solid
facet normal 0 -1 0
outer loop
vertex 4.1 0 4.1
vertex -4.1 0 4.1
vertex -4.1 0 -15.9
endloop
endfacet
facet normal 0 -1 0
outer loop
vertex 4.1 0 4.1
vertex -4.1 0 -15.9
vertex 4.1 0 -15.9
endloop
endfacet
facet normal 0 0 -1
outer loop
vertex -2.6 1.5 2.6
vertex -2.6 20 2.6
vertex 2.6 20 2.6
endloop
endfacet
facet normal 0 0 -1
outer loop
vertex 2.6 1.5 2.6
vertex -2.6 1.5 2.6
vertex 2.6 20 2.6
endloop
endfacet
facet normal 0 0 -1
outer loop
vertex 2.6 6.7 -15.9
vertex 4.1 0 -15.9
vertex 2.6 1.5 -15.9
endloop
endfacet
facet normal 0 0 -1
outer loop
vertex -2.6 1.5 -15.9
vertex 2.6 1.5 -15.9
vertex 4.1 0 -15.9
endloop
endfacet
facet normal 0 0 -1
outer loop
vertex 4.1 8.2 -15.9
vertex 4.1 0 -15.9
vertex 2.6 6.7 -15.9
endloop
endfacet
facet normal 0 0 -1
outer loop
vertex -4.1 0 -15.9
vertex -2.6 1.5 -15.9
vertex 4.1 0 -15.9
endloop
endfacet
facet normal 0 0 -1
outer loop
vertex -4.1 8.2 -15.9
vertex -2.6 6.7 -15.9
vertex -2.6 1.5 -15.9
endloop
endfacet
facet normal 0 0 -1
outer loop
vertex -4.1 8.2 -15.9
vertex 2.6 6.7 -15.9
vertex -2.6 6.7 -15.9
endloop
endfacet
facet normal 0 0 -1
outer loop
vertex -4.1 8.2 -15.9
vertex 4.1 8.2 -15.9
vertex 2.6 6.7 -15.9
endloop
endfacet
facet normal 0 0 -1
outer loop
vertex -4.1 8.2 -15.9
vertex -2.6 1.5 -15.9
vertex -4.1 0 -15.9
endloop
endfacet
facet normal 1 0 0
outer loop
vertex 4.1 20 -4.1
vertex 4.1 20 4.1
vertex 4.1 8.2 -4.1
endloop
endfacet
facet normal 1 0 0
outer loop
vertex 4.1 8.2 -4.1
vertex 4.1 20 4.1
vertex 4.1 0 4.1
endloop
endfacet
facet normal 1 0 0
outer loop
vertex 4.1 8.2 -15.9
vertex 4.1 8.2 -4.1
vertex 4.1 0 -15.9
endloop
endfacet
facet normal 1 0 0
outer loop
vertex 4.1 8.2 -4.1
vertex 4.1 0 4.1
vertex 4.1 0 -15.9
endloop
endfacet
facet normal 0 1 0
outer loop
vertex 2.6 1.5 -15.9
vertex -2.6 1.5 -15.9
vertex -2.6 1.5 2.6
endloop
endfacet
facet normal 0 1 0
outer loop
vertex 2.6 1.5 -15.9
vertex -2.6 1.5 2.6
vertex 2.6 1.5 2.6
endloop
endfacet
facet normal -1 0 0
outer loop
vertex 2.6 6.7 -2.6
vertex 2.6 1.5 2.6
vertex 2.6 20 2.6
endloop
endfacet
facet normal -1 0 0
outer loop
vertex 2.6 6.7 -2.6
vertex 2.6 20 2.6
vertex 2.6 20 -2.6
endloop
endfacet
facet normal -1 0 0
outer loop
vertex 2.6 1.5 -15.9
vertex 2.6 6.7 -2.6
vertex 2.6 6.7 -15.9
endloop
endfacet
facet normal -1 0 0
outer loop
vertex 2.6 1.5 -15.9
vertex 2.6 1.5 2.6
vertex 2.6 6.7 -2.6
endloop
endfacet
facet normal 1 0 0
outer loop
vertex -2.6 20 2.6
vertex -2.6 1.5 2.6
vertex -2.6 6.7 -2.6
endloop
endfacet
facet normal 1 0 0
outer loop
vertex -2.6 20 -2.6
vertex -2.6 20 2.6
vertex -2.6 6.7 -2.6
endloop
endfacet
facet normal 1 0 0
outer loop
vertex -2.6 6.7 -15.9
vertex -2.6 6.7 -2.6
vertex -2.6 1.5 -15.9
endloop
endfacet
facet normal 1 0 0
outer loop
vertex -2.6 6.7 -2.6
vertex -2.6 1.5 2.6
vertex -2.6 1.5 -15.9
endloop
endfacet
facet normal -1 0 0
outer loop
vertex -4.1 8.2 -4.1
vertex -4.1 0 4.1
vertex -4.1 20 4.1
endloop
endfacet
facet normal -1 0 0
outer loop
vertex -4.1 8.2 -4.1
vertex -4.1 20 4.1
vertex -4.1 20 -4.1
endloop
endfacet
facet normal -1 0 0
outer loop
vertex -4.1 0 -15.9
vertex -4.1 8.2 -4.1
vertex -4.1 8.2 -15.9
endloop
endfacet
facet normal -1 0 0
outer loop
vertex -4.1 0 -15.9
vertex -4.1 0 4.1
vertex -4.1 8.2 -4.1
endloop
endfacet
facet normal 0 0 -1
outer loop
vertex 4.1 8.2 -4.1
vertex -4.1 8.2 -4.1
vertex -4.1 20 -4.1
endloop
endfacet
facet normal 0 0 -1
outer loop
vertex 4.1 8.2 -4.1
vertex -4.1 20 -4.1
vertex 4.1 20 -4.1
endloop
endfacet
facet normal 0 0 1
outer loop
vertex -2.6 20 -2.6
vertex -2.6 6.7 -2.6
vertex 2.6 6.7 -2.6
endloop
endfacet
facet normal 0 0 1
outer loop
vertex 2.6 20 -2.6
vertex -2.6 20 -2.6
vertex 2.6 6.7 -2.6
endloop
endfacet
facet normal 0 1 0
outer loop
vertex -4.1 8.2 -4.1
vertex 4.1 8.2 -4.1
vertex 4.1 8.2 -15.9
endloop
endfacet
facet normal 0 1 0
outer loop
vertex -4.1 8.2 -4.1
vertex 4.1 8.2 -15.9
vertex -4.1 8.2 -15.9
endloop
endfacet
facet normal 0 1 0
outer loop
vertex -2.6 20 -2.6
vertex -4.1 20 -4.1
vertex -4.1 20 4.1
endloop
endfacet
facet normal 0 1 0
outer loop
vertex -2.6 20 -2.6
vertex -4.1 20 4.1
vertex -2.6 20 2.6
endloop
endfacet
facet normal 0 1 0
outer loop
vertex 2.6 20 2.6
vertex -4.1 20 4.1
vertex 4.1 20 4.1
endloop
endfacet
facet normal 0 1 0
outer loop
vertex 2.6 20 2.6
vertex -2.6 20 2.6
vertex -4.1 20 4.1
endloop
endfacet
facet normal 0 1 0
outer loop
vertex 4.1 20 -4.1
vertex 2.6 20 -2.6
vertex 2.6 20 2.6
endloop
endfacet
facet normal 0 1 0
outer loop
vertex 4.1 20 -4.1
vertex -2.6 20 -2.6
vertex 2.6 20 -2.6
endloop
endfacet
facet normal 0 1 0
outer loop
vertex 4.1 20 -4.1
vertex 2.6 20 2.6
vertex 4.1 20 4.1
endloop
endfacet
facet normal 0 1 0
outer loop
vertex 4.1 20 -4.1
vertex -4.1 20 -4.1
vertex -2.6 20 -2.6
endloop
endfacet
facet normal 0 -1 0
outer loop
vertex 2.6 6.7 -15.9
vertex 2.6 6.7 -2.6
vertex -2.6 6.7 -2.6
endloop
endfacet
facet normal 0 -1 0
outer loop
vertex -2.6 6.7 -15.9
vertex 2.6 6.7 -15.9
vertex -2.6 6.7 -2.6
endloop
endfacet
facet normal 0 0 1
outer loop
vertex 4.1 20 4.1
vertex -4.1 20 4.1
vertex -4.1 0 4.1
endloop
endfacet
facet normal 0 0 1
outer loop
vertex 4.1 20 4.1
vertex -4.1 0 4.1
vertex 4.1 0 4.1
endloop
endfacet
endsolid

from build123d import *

# Parameters (mm, degrees)
SKETCH1_W           = 8.2
SKETCH1_H           = 8.2
SKETCH1_W_2         = 5.2
SKETCH1_H_2         = 5.2
BOSS_EXTRUDE1_DEPTH = 20
SKETCH2_W           = 8.2
SKETCH2_H           = 8.2
BOSS_EXTRUDE2_DEPTH = 20
SHELL1_T            = -1.5


with BuildPart() as part:
    # Sketch1 → Boss-Extrude1 (new body)
    # profile 1 of 2: a face of its own
    with BuildSketch(Plane(origin=(0, 0, 0), x_dir=(1, 0, 0), z_dir=(0, 1, 0))):
        Rectangle(SKETCH1_W, SKETCH1_H)
        Rectangle(SKETCH1_W_2, SKETCH1_H_2, mode=Mode.SUBTRACT)
    # profile 2 of 2: a face of its own
    with BuildSketch(Plane(origin=(0, 0, 0), x_dir=(1, 0, 0), z_dir=(0, 1, 0))):
        Rectangle(SKETCH1_W_2, SKETCH1_H_2)
    extrude(amount=BOSS_EXTRUDE1_DEPTH)

    # Sketch2 → Boss-Extrude2 (add)
    with BuildSketch(Plane(origin=(0, 0, 4.1), x_dir=(-1, 0, 0), z_dir=(0, 0, -1))):
        with Locations((0, 4.1)):
            Rectangle(SKETCH2_W, SKETCH2_H)
    extrude(amount=BOSS_EXTRUDE2_DEPTH)

    # Shell1
    shell1_openings = [part.faces().sort_by_distance(p)[0] for p in [
        (0, 20, 0),
        (0, 4.1, -15.9),
    ]]
    offset(amount=SHELL1_T, openings=shell1_openings, kind=Kind.INTERSECTION)


solid = part.part
